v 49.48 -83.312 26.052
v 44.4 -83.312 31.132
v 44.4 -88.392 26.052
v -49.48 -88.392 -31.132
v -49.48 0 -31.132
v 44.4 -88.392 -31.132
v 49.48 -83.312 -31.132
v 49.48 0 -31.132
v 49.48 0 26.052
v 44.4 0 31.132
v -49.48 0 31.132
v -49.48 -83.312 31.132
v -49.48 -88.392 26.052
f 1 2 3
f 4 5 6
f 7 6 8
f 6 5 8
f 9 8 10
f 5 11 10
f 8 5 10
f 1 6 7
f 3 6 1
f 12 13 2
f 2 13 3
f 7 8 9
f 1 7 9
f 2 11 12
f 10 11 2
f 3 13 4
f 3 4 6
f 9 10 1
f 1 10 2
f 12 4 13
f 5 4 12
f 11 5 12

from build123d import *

# Parameters (mm, degrees)
F0_W     = 98.959736
F0_H     = 62.263422
F1_DEPTH = 88.392
F2_SIZE  = 5.08


with BuildPart() as f1:
    # F0 (on Front) → F1 (new body)
    with BuildSketch(Plane.XZ):
        Rectangle(F0_W, F0_H)
    extrude(amount=F1_DEPTH)

    # F2
    f2_edges = [f1.edges().sort_by_distance(p)[0] for p in [
        (0, -88.392, 31.131711),
        (49.479868, -44.196, 31.131711),
        (49.479868, -88.392, 0),
    ]]
    chamfer(f2_edges, length=F2_SIZE)


solid = f1.part
